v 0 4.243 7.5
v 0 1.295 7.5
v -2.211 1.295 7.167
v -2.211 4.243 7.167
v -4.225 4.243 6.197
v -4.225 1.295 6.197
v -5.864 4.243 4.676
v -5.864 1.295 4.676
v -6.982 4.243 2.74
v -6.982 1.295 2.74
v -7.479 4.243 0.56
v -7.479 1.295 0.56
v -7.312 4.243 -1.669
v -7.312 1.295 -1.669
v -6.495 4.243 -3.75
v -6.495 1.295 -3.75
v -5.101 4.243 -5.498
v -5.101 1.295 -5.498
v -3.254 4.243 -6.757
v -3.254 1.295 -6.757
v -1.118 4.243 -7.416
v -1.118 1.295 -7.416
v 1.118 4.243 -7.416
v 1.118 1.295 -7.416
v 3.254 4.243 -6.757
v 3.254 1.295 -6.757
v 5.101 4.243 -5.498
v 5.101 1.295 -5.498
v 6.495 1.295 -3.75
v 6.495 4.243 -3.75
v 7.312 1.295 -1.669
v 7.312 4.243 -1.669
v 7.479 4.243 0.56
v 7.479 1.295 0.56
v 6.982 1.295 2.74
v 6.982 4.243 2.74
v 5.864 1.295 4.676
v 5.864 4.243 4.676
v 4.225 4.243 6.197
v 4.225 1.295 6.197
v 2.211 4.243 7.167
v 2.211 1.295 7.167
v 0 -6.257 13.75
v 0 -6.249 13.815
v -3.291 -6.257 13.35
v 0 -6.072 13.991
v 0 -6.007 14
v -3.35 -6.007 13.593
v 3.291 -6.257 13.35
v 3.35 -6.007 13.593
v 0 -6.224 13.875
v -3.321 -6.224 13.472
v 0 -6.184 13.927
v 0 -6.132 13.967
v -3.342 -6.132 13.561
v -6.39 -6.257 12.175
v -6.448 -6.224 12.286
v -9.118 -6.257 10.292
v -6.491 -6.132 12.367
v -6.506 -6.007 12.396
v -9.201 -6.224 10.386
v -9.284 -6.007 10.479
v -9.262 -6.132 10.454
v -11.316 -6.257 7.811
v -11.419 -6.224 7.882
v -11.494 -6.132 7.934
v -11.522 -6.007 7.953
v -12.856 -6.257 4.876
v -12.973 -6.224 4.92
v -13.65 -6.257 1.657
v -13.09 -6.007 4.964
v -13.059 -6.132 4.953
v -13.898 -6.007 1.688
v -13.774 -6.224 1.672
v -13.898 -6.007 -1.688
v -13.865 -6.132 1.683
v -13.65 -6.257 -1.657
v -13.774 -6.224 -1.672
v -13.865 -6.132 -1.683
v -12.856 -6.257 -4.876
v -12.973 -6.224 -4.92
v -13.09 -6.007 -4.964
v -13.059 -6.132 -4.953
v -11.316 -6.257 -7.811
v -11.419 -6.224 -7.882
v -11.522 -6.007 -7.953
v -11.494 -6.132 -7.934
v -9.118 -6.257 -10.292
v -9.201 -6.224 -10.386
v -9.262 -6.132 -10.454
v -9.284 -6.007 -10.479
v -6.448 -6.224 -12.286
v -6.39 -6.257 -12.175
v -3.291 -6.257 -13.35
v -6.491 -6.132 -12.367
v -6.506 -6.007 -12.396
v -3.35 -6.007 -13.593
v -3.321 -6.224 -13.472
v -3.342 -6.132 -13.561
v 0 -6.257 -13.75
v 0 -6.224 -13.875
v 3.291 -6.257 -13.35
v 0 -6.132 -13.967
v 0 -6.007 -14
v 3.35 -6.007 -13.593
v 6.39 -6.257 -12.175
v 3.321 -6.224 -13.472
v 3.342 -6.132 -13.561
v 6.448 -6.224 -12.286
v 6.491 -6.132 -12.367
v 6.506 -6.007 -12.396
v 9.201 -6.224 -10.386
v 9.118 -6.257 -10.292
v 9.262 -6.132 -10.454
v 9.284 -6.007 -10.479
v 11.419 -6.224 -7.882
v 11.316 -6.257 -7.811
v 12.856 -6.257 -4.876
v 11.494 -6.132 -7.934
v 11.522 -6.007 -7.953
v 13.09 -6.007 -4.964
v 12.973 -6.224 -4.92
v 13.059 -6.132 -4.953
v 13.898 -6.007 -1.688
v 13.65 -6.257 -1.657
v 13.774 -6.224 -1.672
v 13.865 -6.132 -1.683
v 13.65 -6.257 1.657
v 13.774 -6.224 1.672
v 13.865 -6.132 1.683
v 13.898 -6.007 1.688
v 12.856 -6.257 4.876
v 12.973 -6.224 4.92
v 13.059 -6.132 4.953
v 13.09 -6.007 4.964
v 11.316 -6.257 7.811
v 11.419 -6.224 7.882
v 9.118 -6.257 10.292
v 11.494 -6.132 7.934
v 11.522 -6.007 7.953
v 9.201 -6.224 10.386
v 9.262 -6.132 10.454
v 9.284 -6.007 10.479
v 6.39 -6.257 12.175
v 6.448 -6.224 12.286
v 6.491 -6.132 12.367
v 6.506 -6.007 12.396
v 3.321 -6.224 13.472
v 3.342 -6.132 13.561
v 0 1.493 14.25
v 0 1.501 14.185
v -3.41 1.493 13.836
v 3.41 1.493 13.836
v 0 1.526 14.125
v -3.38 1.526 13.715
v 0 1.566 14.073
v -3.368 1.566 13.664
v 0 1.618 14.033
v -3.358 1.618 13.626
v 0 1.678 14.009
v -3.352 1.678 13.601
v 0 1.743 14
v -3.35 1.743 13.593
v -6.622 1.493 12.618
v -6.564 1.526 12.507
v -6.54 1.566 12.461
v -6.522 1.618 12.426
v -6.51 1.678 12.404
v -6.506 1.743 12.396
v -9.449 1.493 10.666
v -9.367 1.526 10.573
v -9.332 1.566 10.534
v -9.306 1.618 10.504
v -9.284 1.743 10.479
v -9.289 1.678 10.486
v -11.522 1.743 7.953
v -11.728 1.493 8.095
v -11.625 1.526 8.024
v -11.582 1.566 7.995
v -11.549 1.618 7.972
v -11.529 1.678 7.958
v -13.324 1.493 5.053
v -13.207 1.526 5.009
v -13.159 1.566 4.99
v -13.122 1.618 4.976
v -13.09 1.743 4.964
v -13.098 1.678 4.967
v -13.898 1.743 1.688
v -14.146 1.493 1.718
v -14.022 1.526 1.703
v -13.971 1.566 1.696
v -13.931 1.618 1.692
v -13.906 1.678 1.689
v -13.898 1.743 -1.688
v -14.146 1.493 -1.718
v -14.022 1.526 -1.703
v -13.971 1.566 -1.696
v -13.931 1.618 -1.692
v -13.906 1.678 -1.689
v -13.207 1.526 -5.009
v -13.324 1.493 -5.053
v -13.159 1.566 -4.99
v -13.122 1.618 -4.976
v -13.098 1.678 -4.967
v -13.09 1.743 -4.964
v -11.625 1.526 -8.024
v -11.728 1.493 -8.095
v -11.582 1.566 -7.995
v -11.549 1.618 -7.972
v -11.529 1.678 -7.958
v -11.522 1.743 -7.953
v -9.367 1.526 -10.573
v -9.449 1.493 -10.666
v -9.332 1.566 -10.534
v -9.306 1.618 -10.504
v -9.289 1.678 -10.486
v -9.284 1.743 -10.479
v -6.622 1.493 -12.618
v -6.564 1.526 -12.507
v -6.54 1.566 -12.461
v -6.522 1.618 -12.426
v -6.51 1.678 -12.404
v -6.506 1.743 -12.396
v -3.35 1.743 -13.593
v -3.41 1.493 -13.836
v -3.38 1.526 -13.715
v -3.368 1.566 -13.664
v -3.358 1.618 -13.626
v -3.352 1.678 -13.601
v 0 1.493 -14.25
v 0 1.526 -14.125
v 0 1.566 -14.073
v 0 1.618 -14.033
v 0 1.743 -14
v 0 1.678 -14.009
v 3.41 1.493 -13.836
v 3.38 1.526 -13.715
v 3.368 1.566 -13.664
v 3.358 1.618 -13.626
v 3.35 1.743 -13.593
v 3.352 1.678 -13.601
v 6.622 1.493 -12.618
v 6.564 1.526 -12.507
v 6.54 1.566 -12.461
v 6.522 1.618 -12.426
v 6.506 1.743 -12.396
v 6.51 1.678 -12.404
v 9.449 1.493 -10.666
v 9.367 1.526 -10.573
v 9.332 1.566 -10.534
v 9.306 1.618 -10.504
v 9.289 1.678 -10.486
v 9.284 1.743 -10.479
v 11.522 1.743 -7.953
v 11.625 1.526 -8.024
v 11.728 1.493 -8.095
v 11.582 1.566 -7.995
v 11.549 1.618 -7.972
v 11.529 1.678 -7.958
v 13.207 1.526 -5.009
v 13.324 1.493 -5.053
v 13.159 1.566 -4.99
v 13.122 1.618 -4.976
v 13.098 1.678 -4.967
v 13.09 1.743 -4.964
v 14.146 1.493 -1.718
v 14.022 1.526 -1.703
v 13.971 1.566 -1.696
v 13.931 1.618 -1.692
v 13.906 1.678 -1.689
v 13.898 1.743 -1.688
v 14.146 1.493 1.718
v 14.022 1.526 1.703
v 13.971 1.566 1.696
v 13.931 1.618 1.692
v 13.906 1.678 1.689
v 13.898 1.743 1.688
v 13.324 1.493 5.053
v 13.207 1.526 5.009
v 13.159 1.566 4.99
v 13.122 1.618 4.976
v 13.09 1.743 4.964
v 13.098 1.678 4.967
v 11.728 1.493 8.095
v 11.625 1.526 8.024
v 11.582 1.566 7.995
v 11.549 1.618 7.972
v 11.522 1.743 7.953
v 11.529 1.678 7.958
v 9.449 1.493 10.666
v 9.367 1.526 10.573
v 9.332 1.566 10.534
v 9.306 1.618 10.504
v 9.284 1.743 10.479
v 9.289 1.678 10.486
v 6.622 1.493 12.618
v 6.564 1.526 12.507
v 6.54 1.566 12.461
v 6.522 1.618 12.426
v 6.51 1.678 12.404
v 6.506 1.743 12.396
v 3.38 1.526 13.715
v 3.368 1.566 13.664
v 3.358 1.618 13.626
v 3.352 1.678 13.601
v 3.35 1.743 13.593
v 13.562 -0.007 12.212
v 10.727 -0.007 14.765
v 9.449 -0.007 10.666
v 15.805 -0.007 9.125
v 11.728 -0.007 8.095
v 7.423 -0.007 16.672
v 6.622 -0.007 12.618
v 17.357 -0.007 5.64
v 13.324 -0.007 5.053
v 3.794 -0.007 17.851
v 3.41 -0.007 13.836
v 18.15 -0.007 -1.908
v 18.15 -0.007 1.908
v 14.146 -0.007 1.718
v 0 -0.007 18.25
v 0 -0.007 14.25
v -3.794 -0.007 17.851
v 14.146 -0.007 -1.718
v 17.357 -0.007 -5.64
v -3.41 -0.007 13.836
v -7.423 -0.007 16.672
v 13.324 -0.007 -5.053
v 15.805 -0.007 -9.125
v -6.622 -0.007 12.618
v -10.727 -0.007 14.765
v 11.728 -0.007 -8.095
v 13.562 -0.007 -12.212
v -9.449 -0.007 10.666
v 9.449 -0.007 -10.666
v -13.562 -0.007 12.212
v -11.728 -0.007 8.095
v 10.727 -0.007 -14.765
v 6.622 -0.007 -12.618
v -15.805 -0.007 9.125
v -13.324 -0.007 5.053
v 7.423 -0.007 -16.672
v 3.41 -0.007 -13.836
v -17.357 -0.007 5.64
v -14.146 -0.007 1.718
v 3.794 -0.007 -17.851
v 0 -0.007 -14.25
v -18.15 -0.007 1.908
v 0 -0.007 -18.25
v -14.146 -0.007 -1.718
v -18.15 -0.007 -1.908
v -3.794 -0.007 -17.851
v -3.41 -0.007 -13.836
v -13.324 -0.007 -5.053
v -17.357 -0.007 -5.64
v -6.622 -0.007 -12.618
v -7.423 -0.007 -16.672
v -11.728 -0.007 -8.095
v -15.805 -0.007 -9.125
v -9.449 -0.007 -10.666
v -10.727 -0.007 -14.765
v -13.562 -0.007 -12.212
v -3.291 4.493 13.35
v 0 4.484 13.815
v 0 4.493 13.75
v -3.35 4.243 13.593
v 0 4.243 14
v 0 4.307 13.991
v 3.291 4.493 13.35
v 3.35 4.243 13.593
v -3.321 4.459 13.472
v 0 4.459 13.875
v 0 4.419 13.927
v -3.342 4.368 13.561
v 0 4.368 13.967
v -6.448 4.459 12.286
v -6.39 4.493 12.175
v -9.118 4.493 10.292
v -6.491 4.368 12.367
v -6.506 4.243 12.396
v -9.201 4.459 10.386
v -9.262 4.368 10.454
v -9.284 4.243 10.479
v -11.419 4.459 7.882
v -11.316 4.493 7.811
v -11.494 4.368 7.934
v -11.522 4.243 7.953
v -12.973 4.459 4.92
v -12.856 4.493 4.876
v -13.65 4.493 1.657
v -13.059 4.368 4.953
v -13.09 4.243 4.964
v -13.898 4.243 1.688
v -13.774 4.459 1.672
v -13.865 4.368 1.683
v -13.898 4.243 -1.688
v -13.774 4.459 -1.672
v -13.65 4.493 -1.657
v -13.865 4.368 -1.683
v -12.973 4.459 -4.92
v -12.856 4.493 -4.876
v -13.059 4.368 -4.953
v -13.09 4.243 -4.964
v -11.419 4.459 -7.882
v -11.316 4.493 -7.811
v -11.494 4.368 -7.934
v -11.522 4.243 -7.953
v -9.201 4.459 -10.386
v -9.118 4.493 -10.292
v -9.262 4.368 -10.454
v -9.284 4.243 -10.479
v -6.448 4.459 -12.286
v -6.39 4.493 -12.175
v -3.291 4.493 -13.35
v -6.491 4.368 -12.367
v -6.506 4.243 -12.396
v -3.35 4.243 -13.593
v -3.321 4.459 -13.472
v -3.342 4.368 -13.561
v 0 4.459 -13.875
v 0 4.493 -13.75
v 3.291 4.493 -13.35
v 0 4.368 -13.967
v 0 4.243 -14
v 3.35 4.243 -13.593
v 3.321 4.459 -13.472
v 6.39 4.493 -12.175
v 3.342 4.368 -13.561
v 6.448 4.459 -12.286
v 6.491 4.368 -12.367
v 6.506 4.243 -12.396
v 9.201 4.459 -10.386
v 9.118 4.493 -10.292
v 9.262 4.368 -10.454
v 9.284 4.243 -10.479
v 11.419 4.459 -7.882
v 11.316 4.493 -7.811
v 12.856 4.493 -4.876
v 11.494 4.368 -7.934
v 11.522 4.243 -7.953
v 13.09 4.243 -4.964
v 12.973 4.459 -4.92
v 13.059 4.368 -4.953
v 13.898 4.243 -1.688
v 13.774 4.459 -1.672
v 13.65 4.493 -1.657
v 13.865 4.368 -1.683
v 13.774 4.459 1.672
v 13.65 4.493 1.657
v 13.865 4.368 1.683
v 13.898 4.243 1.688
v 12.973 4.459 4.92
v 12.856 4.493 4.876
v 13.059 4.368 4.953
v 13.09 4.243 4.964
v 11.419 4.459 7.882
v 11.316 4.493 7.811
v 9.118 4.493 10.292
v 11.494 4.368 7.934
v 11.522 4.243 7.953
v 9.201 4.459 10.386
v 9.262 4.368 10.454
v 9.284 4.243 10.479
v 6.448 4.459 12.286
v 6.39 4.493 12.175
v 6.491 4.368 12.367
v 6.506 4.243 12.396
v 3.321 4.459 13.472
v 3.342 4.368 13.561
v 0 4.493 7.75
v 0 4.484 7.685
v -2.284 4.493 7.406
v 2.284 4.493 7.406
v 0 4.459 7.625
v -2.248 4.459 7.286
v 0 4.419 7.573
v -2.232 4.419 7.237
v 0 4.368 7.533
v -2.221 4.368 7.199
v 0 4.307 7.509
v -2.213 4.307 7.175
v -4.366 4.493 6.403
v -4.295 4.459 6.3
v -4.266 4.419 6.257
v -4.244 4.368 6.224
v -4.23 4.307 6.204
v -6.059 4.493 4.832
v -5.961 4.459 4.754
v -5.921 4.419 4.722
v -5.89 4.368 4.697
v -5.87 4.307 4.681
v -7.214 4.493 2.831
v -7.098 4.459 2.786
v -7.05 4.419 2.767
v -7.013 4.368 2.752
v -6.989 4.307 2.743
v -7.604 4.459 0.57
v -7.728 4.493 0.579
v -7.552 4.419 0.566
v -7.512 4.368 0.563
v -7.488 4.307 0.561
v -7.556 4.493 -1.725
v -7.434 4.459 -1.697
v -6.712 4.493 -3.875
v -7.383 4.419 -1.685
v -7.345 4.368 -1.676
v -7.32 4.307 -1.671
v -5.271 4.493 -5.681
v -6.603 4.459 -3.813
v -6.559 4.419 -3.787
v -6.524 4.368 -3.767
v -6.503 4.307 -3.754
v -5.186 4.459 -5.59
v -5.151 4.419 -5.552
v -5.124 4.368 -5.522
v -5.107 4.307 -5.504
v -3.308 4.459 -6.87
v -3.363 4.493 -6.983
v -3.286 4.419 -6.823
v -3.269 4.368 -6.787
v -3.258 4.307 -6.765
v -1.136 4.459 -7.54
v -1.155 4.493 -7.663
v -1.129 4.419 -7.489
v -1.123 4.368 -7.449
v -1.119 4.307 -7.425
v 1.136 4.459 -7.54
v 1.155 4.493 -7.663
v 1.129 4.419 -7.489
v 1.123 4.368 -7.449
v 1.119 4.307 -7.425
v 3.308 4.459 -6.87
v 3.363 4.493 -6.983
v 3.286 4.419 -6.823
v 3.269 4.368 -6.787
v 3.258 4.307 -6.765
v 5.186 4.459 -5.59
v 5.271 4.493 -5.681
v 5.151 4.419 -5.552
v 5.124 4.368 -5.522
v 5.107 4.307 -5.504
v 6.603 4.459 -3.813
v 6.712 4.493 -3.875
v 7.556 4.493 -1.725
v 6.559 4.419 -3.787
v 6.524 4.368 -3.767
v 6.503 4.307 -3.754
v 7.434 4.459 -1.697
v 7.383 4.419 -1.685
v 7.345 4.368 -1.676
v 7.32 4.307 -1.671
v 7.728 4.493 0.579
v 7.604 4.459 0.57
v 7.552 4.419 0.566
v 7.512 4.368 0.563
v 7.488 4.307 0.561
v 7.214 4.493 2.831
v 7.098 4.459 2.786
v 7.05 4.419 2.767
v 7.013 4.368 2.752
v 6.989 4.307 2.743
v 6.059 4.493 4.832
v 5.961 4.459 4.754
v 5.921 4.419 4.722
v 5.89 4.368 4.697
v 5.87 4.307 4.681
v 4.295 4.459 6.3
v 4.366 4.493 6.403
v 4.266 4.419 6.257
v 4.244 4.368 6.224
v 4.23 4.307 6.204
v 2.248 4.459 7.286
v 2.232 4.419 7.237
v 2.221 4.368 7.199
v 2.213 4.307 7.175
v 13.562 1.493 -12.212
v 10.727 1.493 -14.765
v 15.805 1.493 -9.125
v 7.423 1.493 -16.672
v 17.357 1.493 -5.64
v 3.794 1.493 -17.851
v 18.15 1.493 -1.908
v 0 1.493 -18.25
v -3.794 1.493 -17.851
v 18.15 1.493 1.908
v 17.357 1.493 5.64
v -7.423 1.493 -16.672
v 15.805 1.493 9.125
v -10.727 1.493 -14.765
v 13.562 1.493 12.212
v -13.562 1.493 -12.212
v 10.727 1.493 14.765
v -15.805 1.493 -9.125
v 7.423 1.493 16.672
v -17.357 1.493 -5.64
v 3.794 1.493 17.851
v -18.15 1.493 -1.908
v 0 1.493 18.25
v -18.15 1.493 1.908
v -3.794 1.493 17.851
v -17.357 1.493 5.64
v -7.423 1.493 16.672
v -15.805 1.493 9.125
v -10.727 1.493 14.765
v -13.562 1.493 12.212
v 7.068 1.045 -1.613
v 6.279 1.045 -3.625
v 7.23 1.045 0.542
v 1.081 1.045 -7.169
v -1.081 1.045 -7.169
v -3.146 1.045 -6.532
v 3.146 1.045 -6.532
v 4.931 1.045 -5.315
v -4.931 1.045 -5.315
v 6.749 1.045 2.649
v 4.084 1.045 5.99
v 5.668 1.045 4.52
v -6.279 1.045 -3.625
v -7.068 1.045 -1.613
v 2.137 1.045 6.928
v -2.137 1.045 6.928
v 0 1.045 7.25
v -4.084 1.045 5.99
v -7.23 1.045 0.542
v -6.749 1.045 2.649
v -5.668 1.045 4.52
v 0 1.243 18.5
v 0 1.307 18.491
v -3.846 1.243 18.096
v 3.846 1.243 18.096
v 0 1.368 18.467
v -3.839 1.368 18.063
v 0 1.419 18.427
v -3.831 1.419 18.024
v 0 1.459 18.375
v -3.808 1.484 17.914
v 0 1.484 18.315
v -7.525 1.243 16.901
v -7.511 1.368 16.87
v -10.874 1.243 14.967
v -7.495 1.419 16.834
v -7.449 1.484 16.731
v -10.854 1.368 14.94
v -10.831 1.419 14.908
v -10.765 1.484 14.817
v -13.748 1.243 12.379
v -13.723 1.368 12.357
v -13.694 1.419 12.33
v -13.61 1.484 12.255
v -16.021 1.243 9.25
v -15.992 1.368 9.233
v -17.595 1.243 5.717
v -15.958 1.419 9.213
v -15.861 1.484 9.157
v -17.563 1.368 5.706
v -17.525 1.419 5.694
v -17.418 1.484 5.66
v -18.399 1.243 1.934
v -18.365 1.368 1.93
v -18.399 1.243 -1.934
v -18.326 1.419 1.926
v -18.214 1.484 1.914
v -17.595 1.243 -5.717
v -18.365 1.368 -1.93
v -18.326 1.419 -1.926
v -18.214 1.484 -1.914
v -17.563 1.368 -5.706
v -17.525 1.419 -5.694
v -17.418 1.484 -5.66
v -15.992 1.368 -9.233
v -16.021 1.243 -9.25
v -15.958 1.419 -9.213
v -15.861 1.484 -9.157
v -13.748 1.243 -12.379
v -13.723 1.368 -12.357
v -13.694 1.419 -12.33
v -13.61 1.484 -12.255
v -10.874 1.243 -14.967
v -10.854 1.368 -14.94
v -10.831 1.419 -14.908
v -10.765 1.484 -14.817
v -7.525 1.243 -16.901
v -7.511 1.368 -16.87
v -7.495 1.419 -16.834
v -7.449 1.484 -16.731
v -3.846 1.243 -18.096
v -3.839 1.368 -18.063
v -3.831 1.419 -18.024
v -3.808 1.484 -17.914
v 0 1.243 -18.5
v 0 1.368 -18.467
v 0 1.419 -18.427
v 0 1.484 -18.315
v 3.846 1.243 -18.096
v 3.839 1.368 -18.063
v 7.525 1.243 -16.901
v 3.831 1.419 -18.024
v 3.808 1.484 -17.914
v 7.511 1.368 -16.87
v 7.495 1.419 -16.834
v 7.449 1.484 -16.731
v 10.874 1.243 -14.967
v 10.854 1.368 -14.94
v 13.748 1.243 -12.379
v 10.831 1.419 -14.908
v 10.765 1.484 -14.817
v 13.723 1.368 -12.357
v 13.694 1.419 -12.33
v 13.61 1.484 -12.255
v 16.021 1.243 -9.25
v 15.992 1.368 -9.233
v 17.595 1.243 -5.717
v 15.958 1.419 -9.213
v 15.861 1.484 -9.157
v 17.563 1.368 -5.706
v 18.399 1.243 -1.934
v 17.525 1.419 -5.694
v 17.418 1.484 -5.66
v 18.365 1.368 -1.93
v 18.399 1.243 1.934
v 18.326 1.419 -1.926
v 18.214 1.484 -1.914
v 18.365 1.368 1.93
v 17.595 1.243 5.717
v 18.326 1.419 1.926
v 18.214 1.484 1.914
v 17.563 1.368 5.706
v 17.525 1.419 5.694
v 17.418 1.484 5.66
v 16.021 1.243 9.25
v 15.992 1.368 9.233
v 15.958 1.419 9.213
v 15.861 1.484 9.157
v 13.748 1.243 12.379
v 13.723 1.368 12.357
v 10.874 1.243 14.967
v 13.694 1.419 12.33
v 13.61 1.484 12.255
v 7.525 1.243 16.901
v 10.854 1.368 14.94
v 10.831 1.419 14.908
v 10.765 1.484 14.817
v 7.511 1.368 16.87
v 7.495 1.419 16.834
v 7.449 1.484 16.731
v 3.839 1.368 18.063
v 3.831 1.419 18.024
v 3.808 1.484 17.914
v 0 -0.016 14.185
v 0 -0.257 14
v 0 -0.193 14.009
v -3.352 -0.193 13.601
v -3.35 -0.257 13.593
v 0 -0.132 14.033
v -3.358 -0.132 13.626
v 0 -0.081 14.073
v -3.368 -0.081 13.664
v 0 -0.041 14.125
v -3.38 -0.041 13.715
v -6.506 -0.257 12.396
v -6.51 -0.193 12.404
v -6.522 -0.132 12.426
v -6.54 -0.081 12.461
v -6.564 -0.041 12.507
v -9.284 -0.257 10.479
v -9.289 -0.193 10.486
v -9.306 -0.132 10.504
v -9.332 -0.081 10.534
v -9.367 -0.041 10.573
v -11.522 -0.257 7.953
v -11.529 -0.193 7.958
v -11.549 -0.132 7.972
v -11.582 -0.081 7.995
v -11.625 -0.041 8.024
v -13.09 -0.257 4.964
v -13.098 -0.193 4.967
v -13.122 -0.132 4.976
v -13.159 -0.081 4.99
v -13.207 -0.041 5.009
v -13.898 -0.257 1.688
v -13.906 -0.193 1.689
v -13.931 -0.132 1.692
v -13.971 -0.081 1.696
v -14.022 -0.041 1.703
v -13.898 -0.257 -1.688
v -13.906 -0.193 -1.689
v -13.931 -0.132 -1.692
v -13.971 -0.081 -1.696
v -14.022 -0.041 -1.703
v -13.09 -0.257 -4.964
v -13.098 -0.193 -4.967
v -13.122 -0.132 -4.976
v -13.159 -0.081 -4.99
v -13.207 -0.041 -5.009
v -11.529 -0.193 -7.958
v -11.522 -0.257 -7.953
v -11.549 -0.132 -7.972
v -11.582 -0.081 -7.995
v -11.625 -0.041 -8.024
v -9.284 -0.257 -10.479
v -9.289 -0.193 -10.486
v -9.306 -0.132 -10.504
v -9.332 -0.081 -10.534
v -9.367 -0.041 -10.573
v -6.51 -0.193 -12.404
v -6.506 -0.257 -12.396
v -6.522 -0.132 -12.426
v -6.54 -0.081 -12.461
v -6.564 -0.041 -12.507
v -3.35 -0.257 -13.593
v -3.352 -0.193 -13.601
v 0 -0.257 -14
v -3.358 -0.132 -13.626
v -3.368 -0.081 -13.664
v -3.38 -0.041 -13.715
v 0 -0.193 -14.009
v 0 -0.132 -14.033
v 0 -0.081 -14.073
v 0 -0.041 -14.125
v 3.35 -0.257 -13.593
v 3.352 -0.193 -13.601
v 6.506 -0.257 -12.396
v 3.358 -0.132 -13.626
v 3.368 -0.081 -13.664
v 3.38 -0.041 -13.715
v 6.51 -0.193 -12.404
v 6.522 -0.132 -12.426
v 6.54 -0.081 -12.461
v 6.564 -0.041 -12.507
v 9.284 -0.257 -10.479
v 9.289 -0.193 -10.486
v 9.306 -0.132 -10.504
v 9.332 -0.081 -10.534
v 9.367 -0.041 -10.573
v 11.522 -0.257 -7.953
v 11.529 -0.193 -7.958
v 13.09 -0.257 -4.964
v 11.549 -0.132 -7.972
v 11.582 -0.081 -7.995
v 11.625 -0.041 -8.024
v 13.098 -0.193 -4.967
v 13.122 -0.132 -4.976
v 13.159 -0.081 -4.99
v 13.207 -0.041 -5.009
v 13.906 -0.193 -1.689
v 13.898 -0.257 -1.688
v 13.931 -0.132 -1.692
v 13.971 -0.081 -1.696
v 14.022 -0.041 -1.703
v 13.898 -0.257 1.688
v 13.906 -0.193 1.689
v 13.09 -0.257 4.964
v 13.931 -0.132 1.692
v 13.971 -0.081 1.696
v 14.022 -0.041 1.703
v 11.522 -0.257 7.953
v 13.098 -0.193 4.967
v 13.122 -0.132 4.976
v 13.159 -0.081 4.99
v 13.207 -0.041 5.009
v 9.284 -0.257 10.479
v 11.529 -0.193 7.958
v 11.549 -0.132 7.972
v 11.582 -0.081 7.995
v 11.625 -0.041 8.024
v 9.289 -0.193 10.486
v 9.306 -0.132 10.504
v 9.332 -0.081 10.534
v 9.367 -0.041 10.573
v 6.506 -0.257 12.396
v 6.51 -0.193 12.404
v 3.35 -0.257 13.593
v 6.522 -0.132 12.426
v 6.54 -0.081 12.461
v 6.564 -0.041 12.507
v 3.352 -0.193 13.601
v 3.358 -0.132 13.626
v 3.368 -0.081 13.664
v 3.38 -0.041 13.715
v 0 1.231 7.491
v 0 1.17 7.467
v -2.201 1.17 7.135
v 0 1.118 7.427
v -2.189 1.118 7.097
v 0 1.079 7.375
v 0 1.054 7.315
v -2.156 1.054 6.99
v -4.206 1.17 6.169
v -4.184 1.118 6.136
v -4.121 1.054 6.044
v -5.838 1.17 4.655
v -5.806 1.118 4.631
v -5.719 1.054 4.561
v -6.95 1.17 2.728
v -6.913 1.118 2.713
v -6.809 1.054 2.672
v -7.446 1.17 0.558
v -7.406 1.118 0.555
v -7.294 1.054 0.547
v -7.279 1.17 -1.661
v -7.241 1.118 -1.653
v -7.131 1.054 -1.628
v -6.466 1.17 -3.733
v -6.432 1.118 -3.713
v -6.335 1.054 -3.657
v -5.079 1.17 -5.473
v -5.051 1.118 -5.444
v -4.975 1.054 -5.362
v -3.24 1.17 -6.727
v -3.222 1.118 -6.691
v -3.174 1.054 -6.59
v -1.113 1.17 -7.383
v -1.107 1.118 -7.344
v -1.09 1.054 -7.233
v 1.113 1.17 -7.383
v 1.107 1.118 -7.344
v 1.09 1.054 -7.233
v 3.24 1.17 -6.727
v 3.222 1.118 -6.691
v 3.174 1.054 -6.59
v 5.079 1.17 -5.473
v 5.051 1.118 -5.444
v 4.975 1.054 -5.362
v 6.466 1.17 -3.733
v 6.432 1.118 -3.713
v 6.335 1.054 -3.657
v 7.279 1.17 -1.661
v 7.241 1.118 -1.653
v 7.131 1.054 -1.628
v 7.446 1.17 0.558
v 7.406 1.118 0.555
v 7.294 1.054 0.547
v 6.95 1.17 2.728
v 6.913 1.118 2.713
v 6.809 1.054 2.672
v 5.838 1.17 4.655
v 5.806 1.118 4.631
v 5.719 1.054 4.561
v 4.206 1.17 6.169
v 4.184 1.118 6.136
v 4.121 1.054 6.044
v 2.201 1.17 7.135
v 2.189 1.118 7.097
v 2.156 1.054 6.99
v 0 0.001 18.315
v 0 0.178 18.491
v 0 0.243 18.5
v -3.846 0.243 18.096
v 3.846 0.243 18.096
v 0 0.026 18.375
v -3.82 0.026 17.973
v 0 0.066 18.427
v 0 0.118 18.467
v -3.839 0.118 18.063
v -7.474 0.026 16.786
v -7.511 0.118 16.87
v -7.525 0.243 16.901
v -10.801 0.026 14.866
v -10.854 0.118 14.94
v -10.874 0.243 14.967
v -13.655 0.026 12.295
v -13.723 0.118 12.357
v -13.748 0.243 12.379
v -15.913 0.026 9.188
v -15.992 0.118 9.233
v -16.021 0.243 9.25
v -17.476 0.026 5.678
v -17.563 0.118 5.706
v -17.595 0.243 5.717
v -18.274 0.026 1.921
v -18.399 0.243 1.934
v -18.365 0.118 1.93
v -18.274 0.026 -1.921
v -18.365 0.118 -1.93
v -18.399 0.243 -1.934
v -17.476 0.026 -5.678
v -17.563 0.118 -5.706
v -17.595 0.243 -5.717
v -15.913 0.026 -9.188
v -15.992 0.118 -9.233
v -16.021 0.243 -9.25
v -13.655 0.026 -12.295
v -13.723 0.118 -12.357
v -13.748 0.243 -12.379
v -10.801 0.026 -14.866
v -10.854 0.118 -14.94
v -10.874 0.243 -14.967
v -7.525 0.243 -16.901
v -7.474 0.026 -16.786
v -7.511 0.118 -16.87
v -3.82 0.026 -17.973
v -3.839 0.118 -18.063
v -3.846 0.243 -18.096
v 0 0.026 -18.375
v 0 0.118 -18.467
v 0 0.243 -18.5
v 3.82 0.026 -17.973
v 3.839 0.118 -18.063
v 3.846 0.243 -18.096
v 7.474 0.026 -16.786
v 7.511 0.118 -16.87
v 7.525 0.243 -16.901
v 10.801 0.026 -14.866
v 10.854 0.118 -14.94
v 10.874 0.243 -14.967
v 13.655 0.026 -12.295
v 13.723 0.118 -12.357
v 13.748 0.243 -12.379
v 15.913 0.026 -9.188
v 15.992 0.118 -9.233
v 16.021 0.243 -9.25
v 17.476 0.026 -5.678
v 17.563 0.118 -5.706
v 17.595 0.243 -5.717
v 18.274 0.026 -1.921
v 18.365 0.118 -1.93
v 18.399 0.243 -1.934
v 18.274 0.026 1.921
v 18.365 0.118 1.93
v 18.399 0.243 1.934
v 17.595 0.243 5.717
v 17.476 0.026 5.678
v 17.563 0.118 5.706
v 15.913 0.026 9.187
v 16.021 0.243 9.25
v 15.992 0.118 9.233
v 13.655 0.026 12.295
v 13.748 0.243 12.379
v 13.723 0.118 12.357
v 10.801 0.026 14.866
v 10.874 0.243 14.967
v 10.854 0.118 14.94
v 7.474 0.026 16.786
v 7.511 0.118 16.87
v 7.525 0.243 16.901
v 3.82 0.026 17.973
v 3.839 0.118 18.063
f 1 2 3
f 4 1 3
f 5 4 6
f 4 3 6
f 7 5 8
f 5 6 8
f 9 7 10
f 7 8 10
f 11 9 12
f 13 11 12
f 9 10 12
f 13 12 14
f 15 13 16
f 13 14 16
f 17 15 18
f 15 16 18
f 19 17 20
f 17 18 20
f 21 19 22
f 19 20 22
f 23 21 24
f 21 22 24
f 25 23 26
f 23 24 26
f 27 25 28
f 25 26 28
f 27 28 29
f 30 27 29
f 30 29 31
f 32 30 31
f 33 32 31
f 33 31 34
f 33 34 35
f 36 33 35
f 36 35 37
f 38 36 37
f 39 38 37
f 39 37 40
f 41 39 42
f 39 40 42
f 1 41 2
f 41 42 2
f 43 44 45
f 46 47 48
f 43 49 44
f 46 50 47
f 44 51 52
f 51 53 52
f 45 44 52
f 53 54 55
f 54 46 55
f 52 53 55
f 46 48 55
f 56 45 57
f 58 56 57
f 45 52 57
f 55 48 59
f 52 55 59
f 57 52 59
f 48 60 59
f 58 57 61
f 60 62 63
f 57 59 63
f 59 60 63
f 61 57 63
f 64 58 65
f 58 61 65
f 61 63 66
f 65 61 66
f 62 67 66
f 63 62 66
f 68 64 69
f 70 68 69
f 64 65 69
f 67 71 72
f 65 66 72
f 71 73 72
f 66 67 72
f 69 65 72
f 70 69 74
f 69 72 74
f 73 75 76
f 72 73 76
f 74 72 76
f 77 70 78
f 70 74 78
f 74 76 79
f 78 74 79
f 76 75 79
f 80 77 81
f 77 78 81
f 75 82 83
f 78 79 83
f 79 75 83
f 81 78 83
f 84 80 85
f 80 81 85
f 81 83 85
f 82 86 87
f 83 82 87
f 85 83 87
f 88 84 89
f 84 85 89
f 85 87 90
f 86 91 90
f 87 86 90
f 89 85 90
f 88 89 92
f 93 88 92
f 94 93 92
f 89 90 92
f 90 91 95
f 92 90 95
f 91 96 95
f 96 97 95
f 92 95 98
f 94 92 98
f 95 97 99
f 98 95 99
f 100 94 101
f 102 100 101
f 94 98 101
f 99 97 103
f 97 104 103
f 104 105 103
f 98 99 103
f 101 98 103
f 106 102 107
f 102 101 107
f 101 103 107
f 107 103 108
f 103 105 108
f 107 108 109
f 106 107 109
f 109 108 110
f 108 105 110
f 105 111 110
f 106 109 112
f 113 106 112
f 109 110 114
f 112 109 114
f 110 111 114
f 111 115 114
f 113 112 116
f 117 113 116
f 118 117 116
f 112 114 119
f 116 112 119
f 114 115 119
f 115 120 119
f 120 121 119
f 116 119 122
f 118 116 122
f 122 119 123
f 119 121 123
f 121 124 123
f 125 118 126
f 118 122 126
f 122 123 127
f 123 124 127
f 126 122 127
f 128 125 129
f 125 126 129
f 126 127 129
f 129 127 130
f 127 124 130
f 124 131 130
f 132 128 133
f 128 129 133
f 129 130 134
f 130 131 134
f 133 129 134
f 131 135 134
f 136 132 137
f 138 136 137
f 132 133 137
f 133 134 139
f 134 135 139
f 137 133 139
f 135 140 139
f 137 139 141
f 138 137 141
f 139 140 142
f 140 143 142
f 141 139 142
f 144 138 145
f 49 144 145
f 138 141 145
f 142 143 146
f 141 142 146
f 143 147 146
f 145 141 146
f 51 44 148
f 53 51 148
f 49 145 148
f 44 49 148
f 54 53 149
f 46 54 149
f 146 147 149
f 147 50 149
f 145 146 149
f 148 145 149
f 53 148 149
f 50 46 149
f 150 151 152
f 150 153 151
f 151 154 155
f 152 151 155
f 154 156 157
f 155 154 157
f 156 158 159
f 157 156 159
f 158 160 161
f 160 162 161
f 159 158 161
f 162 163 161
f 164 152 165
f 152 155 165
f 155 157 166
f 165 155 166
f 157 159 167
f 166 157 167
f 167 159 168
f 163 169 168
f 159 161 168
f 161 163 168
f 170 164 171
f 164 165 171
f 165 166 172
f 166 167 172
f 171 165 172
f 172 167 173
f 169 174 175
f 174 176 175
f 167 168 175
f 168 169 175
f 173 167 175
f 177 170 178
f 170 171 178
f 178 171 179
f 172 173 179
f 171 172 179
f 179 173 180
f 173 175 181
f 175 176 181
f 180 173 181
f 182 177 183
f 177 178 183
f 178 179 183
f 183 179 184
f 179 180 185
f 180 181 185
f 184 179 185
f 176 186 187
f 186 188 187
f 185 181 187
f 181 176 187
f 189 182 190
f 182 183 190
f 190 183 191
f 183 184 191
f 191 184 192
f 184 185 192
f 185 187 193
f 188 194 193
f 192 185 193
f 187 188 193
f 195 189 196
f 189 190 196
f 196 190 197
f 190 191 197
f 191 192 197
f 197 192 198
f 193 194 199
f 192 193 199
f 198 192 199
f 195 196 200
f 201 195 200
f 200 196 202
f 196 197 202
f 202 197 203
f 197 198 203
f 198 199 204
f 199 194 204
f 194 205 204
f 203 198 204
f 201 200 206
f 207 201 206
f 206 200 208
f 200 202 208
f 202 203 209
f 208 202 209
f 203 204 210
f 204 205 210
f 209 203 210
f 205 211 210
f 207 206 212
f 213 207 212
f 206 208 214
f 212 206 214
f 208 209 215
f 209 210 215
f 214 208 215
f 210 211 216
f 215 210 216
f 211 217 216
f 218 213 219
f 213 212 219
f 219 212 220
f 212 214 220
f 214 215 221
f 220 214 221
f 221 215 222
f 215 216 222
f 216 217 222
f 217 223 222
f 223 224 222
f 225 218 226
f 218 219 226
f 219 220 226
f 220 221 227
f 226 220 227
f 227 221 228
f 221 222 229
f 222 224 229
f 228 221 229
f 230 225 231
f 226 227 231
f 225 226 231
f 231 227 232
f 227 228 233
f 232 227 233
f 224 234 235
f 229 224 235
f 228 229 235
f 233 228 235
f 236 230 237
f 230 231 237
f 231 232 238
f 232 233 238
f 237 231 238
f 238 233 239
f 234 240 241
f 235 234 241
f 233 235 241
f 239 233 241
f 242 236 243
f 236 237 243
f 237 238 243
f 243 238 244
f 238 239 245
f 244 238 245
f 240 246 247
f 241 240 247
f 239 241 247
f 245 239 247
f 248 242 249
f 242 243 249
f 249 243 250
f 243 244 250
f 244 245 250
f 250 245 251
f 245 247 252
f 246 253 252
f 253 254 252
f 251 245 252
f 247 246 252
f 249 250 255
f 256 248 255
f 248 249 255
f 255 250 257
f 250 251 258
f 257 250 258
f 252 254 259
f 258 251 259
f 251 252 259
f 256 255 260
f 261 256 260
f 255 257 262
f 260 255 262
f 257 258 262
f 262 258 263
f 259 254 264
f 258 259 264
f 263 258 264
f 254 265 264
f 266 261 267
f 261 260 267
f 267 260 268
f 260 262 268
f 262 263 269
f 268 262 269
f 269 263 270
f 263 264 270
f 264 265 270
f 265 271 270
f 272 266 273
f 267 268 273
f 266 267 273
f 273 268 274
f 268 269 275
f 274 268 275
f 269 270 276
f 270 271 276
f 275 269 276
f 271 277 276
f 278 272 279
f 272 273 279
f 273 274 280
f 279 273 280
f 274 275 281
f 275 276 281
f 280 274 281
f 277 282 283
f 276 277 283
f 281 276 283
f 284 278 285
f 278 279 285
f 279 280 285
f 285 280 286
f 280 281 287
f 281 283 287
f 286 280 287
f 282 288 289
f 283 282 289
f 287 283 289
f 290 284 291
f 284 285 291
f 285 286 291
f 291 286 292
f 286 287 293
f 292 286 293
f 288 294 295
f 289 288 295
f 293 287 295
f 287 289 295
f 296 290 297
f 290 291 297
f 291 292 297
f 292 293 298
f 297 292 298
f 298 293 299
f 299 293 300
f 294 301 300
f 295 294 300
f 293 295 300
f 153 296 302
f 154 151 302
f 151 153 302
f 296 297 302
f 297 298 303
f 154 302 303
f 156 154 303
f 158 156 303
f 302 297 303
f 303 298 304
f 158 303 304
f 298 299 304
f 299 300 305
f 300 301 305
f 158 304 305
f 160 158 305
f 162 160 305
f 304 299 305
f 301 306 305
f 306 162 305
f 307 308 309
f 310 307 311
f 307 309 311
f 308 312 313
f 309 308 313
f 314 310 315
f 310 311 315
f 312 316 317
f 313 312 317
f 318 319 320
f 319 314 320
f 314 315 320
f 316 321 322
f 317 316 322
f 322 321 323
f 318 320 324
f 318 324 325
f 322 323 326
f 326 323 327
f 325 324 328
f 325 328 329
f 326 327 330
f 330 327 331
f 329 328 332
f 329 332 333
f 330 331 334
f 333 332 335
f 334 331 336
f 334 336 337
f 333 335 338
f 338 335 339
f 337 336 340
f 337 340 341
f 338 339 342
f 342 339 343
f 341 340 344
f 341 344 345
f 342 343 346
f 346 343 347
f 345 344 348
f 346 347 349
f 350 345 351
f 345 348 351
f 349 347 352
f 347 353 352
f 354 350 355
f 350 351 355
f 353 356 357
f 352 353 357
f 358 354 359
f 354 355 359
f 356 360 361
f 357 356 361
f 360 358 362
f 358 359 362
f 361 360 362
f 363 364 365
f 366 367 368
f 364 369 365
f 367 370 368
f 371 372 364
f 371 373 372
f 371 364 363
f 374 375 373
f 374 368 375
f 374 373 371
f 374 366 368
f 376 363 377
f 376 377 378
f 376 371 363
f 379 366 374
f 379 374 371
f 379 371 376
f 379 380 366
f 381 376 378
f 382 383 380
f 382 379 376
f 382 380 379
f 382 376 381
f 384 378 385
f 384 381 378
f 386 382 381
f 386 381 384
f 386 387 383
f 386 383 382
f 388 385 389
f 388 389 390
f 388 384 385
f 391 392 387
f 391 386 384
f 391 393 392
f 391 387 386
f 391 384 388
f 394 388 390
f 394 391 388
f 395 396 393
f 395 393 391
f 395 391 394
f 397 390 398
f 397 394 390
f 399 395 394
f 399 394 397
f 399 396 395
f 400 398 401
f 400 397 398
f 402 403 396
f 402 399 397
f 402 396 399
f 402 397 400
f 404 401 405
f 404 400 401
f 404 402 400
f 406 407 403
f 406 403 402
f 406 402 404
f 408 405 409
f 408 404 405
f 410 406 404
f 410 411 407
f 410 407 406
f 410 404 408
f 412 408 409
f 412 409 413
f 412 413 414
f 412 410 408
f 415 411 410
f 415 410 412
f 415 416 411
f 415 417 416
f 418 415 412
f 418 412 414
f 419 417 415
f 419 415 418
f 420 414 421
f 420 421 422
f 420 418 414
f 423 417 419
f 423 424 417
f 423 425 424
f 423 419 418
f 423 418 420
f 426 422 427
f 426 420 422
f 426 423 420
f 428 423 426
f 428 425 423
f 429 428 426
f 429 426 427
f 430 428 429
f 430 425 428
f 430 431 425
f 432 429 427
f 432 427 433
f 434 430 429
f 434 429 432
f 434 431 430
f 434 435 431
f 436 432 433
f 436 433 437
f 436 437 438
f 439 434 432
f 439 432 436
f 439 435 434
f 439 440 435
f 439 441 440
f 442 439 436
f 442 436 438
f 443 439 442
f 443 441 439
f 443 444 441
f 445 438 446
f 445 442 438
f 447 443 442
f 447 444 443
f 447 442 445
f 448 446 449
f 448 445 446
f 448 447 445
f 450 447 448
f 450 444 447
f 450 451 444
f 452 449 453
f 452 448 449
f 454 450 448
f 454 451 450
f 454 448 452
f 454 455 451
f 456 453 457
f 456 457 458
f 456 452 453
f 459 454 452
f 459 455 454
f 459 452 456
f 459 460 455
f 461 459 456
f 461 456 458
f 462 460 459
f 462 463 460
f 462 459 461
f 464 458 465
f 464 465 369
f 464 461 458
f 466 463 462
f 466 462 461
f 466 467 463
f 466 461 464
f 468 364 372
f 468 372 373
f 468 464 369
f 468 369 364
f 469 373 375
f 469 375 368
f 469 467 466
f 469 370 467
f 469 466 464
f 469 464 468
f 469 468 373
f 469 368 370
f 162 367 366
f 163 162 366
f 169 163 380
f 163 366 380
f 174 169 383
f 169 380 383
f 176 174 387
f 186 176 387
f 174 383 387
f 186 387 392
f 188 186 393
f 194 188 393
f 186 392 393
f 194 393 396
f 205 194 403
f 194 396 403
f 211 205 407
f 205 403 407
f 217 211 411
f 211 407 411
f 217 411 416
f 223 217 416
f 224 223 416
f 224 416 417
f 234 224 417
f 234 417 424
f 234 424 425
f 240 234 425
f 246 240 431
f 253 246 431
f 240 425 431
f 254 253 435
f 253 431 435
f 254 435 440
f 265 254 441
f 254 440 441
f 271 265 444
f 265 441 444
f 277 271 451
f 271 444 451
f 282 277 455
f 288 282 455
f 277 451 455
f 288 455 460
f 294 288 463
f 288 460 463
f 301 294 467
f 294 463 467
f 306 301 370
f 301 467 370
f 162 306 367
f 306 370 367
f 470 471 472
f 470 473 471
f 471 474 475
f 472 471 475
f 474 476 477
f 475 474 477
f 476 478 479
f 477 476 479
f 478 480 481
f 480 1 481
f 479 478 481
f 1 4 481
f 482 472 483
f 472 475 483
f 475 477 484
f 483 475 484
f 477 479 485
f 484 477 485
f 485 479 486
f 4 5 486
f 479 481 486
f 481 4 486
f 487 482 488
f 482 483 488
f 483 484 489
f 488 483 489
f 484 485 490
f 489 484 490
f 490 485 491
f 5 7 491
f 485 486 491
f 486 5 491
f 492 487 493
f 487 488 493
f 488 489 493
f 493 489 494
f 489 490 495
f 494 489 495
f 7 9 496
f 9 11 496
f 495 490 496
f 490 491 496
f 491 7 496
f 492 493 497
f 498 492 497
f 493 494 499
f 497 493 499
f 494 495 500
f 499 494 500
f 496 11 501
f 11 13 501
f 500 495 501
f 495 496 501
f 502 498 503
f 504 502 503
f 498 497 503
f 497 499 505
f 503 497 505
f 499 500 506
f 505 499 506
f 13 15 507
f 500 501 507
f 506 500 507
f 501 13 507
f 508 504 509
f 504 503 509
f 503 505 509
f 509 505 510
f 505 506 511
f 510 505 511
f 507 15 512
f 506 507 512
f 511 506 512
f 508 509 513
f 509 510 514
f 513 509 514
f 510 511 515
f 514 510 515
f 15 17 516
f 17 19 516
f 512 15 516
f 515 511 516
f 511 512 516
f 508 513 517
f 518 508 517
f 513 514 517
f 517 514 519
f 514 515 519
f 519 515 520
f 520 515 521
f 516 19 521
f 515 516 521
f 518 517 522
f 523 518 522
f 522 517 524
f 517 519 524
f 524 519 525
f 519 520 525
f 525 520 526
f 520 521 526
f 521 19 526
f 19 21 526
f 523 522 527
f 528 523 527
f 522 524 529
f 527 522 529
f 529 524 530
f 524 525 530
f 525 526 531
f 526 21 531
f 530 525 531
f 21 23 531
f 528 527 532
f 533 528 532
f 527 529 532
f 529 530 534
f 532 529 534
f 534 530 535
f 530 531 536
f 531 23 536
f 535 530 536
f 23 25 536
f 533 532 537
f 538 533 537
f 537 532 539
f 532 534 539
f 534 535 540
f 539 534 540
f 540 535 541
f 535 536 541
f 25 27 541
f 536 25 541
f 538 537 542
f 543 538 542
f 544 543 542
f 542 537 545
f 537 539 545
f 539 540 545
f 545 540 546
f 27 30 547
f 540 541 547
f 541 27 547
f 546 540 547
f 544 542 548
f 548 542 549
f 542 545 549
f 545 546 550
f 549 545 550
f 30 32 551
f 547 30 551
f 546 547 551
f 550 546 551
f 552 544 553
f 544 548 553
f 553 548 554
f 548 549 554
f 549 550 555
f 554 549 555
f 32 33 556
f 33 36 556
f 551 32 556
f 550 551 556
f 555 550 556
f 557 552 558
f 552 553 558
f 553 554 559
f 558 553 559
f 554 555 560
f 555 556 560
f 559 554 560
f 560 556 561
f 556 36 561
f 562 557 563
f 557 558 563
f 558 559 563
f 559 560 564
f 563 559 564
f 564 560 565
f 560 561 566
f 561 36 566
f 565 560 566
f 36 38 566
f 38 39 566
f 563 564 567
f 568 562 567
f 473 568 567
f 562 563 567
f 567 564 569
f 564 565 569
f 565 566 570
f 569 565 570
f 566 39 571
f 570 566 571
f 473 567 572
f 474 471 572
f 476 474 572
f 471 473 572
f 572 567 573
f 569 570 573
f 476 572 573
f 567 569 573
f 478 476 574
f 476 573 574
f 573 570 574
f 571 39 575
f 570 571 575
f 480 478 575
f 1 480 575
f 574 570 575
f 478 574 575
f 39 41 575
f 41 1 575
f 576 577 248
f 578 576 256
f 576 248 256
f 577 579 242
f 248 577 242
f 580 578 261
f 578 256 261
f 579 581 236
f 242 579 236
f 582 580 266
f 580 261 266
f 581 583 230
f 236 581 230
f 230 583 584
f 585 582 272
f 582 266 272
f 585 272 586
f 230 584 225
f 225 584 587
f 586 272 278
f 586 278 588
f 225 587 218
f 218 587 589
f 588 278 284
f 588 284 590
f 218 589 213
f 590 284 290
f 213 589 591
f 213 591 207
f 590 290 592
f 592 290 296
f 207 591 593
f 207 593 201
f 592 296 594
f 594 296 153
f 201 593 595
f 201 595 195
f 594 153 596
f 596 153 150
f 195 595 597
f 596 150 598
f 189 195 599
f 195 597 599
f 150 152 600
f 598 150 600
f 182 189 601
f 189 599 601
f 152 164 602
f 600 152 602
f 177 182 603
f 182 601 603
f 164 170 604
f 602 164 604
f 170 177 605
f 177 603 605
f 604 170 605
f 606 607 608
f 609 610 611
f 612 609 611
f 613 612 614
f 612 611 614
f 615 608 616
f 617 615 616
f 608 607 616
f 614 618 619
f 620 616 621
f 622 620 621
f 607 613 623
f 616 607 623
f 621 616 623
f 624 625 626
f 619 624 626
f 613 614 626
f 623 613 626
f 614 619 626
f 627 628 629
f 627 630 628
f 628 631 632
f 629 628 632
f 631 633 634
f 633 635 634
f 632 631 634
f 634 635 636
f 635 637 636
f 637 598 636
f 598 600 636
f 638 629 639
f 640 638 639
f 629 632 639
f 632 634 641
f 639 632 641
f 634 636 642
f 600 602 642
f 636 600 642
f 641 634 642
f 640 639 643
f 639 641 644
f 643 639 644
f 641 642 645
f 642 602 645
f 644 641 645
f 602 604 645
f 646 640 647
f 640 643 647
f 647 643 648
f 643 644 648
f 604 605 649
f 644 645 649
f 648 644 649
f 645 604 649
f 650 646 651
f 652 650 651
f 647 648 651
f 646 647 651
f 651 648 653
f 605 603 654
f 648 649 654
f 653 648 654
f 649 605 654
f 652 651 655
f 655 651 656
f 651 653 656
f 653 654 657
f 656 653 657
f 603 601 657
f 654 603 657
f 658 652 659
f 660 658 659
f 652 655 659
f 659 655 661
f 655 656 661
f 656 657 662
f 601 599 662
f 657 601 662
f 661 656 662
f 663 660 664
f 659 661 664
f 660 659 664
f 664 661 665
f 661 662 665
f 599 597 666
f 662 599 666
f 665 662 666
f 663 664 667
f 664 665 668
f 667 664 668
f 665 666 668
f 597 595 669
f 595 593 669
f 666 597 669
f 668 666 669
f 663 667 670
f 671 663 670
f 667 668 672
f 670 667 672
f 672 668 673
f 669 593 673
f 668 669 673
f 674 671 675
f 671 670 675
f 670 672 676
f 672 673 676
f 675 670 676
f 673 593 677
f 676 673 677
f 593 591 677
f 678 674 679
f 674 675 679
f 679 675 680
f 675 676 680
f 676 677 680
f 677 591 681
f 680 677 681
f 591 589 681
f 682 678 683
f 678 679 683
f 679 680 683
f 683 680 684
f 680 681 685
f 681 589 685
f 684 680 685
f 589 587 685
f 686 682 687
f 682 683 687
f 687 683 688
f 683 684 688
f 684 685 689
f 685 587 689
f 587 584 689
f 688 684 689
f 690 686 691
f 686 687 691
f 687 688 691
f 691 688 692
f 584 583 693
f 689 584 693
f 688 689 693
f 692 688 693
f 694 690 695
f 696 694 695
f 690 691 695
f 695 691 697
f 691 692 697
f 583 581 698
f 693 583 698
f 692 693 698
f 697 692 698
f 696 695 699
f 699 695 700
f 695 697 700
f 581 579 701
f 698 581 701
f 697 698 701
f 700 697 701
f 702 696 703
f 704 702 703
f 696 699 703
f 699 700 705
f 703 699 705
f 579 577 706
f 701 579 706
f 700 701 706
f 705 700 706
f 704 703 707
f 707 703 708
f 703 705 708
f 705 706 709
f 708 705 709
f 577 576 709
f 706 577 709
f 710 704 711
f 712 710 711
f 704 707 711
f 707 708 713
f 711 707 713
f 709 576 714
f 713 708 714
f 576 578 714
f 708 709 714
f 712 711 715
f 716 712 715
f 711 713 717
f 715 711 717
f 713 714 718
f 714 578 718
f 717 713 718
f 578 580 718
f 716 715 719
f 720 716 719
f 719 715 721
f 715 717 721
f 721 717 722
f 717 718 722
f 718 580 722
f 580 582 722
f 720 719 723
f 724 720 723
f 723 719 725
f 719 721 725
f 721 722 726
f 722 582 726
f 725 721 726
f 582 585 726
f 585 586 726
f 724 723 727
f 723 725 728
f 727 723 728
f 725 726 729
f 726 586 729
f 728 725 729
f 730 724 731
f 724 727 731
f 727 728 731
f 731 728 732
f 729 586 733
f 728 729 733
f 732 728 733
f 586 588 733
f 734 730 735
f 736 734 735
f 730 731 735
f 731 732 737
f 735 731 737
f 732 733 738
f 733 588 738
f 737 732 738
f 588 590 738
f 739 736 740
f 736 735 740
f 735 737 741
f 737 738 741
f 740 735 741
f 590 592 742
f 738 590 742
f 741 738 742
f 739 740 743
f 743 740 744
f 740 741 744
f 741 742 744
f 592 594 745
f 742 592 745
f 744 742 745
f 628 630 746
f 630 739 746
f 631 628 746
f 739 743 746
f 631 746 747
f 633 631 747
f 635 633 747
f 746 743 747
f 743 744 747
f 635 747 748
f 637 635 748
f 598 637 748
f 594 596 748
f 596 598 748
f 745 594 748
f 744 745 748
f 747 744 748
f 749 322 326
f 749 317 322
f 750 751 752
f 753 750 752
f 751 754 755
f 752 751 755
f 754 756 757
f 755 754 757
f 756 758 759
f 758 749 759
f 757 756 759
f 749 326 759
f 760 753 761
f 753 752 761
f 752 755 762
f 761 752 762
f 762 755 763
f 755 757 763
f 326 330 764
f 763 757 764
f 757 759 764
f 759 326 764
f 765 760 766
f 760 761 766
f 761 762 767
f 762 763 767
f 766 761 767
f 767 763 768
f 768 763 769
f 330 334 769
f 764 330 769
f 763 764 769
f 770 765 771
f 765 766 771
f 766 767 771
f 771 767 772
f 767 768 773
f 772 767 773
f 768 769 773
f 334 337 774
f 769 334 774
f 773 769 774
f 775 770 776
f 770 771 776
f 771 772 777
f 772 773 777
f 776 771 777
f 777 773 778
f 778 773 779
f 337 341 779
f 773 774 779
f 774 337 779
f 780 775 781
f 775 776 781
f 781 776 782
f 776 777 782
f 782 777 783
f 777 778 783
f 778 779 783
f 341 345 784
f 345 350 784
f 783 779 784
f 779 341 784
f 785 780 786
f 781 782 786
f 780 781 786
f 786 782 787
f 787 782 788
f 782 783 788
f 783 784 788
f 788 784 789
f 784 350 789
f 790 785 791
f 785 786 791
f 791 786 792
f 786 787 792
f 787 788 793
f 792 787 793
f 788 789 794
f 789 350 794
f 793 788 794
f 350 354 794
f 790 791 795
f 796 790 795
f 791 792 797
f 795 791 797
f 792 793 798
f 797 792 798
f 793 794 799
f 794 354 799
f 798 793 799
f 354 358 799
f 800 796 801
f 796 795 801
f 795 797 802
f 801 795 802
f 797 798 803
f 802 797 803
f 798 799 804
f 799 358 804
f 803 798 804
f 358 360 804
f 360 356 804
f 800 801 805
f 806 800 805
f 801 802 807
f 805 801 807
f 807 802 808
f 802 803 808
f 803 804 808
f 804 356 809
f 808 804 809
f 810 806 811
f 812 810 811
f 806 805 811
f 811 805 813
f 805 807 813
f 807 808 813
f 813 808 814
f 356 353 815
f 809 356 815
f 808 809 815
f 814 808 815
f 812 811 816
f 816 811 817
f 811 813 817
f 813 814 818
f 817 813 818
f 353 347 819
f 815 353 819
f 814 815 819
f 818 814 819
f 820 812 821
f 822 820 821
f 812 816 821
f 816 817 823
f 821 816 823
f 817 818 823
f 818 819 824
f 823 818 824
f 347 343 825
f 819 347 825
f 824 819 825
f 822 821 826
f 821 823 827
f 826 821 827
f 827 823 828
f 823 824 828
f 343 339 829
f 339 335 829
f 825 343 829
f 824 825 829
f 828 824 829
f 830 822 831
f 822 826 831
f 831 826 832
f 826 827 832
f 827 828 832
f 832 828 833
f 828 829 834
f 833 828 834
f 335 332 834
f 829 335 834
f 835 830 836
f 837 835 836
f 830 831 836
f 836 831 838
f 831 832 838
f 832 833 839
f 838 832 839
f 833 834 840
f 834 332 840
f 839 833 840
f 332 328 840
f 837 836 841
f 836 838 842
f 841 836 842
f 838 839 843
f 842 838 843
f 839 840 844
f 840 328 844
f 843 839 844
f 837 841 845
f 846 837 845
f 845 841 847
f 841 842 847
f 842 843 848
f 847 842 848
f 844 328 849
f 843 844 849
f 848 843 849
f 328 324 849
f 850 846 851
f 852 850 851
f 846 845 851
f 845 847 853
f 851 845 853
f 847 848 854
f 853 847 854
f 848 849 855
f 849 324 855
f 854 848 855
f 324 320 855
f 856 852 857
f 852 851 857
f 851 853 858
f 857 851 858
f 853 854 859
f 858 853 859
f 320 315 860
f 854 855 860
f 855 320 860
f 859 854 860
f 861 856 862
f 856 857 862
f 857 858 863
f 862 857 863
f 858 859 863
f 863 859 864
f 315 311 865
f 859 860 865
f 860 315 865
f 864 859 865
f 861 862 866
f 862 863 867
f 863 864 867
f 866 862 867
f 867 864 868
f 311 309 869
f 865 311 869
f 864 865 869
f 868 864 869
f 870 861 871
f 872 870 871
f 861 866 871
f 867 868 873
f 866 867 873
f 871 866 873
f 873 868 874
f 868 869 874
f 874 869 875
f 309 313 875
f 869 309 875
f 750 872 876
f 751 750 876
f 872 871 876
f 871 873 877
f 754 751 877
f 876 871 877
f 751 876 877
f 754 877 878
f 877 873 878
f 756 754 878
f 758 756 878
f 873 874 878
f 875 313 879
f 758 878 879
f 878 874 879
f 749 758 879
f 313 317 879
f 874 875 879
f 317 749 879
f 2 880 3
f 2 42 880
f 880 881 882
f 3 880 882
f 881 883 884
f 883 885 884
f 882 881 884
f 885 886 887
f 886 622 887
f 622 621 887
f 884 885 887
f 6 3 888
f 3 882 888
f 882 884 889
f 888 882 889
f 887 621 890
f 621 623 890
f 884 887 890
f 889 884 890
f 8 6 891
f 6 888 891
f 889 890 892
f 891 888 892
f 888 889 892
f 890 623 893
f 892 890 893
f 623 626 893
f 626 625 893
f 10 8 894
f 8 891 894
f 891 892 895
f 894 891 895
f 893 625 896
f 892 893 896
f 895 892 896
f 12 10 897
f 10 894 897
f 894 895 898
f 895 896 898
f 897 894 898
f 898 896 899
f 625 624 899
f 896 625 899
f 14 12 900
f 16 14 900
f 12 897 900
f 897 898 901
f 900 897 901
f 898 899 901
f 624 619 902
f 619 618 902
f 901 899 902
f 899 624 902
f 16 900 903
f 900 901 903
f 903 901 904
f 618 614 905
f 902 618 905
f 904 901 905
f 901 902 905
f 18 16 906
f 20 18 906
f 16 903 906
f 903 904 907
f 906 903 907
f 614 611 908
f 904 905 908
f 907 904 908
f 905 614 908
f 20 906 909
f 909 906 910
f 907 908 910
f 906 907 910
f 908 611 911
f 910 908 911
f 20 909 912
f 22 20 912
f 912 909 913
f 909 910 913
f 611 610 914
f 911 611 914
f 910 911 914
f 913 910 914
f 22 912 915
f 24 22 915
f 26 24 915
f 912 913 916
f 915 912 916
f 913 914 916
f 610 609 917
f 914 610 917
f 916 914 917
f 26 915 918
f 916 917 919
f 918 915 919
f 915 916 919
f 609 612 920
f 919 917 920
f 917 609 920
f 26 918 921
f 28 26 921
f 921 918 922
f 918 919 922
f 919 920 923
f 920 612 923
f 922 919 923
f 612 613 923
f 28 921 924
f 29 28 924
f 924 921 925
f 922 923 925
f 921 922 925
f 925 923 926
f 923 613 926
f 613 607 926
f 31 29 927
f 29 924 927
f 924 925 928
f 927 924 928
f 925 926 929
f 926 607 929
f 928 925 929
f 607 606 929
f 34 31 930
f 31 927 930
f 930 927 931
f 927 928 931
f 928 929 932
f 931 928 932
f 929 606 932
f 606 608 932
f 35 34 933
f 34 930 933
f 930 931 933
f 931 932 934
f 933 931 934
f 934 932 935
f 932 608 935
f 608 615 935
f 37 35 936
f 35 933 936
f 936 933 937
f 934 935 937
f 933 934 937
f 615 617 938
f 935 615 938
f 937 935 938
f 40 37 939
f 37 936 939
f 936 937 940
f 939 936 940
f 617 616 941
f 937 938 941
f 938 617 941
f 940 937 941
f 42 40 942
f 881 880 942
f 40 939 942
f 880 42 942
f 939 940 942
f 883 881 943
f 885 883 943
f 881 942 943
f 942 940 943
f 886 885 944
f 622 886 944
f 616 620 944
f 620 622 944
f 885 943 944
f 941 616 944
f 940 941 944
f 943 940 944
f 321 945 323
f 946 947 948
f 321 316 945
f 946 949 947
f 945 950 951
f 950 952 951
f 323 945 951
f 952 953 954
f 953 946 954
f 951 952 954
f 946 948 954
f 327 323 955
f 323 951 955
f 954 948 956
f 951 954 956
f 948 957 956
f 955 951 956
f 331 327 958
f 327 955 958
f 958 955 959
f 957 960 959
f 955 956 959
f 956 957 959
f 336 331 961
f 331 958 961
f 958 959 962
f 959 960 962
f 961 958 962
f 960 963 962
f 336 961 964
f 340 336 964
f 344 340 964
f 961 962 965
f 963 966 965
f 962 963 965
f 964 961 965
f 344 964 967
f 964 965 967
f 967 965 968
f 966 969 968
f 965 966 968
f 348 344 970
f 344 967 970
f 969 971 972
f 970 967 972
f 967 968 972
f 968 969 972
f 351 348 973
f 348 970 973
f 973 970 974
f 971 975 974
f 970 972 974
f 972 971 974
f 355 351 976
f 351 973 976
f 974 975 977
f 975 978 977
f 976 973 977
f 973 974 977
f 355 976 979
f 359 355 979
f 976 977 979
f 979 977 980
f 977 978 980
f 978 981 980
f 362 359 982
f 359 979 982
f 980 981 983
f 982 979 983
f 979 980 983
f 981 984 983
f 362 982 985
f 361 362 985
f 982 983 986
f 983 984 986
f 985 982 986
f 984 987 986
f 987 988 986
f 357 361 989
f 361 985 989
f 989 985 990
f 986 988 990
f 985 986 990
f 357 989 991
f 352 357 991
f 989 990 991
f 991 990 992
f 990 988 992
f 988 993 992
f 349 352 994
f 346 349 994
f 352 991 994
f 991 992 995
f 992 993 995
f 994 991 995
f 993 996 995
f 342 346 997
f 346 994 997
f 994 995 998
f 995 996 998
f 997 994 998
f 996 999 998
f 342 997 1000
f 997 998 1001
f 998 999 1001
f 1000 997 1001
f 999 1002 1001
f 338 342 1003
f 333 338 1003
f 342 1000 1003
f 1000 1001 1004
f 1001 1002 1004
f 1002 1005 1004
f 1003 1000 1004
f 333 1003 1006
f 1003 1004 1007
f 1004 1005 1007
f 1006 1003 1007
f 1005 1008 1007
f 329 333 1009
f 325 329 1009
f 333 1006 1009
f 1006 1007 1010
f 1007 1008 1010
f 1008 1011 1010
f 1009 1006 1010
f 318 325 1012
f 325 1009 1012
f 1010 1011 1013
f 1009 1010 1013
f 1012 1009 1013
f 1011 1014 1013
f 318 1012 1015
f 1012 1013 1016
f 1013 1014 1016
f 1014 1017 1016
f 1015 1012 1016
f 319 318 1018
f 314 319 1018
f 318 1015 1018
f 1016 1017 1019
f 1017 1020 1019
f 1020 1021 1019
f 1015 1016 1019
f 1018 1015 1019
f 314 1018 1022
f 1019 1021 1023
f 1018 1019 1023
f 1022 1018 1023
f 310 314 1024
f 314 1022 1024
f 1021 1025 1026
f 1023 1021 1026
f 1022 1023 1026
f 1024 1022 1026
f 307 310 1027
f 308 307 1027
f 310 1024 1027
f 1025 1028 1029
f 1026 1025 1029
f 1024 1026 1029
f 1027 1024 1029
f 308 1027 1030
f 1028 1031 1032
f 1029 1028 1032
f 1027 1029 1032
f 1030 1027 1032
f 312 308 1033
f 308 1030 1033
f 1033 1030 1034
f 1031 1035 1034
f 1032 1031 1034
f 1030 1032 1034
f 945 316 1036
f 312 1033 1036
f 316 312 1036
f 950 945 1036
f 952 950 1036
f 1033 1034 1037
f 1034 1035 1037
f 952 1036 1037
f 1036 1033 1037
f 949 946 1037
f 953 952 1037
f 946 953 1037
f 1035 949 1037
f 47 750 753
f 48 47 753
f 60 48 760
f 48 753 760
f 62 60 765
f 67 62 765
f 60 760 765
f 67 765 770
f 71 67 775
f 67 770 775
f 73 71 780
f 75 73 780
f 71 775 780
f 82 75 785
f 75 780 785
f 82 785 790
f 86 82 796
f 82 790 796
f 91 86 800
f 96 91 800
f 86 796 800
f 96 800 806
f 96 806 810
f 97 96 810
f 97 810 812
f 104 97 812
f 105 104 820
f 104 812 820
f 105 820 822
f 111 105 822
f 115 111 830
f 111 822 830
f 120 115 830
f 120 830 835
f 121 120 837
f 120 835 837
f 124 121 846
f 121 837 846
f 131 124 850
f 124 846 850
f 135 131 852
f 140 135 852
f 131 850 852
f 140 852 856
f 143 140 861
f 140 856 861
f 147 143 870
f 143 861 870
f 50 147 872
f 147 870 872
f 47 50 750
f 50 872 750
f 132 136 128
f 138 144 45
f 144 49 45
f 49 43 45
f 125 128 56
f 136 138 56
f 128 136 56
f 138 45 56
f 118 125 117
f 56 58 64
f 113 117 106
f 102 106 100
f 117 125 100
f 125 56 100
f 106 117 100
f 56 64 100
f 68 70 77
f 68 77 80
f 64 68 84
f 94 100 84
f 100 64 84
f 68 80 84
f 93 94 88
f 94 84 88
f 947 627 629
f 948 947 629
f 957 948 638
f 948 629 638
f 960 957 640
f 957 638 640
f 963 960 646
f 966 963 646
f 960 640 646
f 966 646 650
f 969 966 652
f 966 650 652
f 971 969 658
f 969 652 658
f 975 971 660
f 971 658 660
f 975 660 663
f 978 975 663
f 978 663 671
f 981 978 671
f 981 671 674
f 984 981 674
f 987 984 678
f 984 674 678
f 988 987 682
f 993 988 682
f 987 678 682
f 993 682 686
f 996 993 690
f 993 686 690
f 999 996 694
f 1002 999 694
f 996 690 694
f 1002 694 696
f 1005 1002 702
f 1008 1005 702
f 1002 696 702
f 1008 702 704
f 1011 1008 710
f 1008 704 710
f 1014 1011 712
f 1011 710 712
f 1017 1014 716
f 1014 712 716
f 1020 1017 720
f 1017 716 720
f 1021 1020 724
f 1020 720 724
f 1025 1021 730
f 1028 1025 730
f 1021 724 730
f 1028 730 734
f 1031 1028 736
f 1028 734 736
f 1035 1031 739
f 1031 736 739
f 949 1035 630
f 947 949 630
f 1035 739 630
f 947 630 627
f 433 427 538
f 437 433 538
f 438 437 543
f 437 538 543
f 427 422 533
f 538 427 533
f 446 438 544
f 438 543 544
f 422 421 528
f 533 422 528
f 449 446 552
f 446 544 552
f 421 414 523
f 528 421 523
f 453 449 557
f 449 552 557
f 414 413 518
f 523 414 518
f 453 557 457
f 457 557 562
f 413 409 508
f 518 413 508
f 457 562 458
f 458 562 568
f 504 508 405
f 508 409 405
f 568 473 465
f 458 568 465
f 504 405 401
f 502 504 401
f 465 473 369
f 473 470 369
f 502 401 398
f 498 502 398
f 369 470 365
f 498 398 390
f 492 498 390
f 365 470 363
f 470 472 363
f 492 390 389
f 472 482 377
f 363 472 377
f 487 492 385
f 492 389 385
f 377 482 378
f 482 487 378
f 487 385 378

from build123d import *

# Parameters (mm, degrees)
FILLET1_R = 0.25


with BuildPart() as part:
    # Sketch1 → Revolve1 (revolve)
    with BuildSketch(Plane.XY, mode=Mode.PRIVATE) as revolve1_sk:
        Polygon((-14, 4.492665037), (-7.5, 4.492665037), (-7.5, 1.045232274), (0, 1.045232274), (0, -6.257334963), (-14, -6.257334963), (-14, -0.007334963), (-18.5, -0.007334963), (-18.5, 1.492665037), (-14, 1.492665037), align=None)
    revolve(revolve1_sk.sketch.rotate(Axis((0, 8.160146699, 0), (0, -1, 0)), 270), axis=Axis((0, 8.160146699, 0), (0, -1, 0)))

    # Fillet1
    fillet1_edges = [part.edges().sort_by_distance(p)[0] for p in [
        (0, 1.045232274, -7.5),
        (0, 4.492665037, -7.5),
        (0, 4.492665037, -14),
        (0, 1.492665037, -14),
        (0, 1.492665037, -18.5),
        (0, -0.007334963, -18.5),
        (0, -0.007334963, -14),
        (0, -6.257334963, -14),
    ]]
    fillet(fillet1_edges, radius=FILLET1_R)


solid = part.part
